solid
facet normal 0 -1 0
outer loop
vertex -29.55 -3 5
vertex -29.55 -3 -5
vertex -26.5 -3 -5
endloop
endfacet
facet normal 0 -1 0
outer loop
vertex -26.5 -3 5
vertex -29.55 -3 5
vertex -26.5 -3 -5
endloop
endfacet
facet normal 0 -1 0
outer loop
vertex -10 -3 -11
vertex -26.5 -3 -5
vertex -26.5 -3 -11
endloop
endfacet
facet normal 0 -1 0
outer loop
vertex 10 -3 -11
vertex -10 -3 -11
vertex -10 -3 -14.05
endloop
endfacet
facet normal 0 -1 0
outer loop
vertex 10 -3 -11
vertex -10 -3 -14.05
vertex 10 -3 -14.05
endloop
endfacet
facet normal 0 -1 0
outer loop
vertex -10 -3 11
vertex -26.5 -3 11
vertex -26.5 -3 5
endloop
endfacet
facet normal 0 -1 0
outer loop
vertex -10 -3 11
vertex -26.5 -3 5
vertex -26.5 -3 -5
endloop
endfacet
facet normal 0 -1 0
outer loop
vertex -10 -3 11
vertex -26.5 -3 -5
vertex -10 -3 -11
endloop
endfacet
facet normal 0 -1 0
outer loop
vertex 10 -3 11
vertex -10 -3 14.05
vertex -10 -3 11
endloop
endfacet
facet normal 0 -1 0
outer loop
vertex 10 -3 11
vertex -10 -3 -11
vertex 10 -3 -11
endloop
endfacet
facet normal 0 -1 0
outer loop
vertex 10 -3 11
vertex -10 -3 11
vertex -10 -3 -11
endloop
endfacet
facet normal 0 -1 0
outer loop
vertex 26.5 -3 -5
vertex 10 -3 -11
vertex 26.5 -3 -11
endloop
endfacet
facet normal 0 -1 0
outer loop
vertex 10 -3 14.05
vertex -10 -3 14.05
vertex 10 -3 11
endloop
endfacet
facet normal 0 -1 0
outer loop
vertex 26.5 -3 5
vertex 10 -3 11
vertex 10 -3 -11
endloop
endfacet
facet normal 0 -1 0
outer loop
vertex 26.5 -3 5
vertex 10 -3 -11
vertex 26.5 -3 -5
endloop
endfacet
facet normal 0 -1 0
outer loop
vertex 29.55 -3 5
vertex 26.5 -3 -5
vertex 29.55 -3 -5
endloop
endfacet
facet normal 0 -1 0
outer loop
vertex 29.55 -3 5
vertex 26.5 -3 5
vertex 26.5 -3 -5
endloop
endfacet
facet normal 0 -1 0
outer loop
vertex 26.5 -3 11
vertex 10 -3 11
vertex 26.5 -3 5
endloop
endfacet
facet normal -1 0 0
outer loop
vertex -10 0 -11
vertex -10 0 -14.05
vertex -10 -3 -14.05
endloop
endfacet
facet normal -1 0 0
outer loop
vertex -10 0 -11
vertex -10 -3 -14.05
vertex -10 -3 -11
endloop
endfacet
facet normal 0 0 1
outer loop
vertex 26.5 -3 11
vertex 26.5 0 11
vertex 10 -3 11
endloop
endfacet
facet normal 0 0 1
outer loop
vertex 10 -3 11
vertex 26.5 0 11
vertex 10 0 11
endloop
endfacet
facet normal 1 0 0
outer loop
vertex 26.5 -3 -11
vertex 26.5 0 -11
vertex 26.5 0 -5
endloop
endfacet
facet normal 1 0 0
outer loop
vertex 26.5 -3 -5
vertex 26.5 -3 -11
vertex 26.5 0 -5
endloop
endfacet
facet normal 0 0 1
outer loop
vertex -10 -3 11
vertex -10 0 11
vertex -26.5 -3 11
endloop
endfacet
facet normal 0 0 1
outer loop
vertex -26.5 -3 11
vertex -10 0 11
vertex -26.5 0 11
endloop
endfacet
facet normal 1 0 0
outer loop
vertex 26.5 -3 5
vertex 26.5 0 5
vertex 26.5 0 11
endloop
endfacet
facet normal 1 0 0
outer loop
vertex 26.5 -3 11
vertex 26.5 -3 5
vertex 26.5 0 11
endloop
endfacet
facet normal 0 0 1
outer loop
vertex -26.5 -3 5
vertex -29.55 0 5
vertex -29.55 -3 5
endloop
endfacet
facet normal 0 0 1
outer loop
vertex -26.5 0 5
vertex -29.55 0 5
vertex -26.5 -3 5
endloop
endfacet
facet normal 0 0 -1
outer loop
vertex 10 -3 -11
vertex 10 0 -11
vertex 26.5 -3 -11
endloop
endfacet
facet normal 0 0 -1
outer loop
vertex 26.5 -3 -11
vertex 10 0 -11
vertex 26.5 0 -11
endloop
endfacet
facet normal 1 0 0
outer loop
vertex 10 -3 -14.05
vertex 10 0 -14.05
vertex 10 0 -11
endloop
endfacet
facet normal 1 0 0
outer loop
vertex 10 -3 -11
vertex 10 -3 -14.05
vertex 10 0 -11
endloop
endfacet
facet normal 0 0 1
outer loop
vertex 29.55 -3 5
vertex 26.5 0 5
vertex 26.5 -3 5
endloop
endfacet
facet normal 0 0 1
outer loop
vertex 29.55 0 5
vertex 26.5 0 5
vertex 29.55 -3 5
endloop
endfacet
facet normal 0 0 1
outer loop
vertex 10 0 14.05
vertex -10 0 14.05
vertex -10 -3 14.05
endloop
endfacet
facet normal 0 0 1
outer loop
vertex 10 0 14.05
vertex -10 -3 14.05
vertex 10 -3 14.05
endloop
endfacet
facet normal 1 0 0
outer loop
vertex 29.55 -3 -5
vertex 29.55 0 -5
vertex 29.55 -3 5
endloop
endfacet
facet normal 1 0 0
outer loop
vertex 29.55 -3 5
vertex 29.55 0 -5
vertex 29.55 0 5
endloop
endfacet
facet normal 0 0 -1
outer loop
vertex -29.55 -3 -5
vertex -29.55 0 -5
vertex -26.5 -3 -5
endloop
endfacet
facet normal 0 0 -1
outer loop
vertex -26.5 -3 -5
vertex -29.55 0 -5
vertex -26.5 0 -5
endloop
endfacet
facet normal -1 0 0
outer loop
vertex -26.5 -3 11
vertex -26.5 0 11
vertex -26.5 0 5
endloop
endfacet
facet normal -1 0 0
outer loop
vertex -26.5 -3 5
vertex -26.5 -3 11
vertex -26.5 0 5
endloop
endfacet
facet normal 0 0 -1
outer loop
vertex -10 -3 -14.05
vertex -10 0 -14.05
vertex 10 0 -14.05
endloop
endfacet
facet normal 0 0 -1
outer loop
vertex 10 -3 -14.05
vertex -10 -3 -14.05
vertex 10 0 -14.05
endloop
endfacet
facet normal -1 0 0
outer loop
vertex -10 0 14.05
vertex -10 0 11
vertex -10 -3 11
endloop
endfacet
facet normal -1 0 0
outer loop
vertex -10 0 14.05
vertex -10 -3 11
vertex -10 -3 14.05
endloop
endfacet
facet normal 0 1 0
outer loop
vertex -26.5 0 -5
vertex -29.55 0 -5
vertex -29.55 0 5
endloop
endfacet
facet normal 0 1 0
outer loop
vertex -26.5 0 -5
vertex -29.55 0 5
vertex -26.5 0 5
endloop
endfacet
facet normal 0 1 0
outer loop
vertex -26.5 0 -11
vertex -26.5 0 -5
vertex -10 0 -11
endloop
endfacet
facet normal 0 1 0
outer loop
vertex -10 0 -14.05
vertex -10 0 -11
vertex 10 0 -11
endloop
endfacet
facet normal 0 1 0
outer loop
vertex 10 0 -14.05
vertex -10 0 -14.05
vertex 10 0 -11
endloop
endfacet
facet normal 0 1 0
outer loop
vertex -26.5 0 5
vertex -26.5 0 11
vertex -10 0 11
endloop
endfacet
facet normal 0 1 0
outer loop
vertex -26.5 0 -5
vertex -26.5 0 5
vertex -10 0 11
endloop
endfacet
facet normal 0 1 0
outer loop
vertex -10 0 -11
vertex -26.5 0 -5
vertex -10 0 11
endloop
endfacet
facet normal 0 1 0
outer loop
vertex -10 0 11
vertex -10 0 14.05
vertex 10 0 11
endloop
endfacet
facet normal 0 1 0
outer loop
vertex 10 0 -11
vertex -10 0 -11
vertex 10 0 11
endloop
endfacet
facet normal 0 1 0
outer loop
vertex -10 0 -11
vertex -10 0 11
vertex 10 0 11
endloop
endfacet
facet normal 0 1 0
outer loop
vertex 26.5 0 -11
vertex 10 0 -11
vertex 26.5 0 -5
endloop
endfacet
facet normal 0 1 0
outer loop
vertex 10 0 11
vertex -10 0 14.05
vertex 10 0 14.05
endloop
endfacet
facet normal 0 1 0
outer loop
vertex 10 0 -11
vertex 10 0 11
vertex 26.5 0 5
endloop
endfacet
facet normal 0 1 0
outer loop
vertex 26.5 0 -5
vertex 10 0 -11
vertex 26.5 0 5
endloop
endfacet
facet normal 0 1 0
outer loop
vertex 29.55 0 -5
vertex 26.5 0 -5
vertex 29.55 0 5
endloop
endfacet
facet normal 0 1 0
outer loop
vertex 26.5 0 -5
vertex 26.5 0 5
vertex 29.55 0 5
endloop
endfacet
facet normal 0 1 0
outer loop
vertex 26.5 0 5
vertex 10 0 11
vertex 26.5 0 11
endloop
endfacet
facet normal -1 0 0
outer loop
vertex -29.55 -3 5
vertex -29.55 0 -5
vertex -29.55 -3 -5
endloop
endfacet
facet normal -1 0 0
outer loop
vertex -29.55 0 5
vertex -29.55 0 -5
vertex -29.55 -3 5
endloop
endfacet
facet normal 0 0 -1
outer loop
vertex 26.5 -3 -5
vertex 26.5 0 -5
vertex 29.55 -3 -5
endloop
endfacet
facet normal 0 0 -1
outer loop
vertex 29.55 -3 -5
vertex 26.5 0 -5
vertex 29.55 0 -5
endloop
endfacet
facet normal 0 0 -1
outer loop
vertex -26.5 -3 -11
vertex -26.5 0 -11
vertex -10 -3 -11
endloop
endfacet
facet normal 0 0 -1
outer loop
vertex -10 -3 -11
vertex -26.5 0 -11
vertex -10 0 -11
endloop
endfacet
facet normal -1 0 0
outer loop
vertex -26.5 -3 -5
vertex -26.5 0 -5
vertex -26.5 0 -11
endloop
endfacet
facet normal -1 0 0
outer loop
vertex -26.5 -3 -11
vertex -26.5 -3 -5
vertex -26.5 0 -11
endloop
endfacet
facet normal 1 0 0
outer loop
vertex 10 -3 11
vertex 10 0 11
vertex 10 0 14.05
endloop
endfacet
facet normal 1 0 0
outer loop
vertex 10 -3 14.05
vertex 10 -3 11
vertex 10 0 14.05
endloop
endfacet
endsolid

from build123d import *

# Parameters (mm, degrees)
F0_W     = 20
F0_H     = 3.05
F0_W_2   = 3.05
F0_H_2   = 10
F1_DEPTH = 3


with BuildPart() as f1:
    # F0 (on Front) → F1 (new body)
    with BuildSketch(Plane.XZ):
        Polygon((10, -11), (26.5, -11), (26.5, -5), (26.5, 5), (26.5, 11), (10, 11), (-10, 11), (-26.5, 11), (-26.5, 5), (-26.5, -5), (-26.5, -11), (-10, -11), align=None)
        with Locations((0, -12.525)):
            Rectangle(F0_W, F0_H)
        with Locations((28.025, 0)):
            Rectangle(F0_W_2, F0_H_2)
        with Locations((-28.025, 0)):
            Rectangle(F0_W_2, F0_H_2)
        with Locations((0, 12.525)):
            Rectangle(F0_W, F0_H)
    extrude(amount=F1_DEPTH)


solid = f1.part
